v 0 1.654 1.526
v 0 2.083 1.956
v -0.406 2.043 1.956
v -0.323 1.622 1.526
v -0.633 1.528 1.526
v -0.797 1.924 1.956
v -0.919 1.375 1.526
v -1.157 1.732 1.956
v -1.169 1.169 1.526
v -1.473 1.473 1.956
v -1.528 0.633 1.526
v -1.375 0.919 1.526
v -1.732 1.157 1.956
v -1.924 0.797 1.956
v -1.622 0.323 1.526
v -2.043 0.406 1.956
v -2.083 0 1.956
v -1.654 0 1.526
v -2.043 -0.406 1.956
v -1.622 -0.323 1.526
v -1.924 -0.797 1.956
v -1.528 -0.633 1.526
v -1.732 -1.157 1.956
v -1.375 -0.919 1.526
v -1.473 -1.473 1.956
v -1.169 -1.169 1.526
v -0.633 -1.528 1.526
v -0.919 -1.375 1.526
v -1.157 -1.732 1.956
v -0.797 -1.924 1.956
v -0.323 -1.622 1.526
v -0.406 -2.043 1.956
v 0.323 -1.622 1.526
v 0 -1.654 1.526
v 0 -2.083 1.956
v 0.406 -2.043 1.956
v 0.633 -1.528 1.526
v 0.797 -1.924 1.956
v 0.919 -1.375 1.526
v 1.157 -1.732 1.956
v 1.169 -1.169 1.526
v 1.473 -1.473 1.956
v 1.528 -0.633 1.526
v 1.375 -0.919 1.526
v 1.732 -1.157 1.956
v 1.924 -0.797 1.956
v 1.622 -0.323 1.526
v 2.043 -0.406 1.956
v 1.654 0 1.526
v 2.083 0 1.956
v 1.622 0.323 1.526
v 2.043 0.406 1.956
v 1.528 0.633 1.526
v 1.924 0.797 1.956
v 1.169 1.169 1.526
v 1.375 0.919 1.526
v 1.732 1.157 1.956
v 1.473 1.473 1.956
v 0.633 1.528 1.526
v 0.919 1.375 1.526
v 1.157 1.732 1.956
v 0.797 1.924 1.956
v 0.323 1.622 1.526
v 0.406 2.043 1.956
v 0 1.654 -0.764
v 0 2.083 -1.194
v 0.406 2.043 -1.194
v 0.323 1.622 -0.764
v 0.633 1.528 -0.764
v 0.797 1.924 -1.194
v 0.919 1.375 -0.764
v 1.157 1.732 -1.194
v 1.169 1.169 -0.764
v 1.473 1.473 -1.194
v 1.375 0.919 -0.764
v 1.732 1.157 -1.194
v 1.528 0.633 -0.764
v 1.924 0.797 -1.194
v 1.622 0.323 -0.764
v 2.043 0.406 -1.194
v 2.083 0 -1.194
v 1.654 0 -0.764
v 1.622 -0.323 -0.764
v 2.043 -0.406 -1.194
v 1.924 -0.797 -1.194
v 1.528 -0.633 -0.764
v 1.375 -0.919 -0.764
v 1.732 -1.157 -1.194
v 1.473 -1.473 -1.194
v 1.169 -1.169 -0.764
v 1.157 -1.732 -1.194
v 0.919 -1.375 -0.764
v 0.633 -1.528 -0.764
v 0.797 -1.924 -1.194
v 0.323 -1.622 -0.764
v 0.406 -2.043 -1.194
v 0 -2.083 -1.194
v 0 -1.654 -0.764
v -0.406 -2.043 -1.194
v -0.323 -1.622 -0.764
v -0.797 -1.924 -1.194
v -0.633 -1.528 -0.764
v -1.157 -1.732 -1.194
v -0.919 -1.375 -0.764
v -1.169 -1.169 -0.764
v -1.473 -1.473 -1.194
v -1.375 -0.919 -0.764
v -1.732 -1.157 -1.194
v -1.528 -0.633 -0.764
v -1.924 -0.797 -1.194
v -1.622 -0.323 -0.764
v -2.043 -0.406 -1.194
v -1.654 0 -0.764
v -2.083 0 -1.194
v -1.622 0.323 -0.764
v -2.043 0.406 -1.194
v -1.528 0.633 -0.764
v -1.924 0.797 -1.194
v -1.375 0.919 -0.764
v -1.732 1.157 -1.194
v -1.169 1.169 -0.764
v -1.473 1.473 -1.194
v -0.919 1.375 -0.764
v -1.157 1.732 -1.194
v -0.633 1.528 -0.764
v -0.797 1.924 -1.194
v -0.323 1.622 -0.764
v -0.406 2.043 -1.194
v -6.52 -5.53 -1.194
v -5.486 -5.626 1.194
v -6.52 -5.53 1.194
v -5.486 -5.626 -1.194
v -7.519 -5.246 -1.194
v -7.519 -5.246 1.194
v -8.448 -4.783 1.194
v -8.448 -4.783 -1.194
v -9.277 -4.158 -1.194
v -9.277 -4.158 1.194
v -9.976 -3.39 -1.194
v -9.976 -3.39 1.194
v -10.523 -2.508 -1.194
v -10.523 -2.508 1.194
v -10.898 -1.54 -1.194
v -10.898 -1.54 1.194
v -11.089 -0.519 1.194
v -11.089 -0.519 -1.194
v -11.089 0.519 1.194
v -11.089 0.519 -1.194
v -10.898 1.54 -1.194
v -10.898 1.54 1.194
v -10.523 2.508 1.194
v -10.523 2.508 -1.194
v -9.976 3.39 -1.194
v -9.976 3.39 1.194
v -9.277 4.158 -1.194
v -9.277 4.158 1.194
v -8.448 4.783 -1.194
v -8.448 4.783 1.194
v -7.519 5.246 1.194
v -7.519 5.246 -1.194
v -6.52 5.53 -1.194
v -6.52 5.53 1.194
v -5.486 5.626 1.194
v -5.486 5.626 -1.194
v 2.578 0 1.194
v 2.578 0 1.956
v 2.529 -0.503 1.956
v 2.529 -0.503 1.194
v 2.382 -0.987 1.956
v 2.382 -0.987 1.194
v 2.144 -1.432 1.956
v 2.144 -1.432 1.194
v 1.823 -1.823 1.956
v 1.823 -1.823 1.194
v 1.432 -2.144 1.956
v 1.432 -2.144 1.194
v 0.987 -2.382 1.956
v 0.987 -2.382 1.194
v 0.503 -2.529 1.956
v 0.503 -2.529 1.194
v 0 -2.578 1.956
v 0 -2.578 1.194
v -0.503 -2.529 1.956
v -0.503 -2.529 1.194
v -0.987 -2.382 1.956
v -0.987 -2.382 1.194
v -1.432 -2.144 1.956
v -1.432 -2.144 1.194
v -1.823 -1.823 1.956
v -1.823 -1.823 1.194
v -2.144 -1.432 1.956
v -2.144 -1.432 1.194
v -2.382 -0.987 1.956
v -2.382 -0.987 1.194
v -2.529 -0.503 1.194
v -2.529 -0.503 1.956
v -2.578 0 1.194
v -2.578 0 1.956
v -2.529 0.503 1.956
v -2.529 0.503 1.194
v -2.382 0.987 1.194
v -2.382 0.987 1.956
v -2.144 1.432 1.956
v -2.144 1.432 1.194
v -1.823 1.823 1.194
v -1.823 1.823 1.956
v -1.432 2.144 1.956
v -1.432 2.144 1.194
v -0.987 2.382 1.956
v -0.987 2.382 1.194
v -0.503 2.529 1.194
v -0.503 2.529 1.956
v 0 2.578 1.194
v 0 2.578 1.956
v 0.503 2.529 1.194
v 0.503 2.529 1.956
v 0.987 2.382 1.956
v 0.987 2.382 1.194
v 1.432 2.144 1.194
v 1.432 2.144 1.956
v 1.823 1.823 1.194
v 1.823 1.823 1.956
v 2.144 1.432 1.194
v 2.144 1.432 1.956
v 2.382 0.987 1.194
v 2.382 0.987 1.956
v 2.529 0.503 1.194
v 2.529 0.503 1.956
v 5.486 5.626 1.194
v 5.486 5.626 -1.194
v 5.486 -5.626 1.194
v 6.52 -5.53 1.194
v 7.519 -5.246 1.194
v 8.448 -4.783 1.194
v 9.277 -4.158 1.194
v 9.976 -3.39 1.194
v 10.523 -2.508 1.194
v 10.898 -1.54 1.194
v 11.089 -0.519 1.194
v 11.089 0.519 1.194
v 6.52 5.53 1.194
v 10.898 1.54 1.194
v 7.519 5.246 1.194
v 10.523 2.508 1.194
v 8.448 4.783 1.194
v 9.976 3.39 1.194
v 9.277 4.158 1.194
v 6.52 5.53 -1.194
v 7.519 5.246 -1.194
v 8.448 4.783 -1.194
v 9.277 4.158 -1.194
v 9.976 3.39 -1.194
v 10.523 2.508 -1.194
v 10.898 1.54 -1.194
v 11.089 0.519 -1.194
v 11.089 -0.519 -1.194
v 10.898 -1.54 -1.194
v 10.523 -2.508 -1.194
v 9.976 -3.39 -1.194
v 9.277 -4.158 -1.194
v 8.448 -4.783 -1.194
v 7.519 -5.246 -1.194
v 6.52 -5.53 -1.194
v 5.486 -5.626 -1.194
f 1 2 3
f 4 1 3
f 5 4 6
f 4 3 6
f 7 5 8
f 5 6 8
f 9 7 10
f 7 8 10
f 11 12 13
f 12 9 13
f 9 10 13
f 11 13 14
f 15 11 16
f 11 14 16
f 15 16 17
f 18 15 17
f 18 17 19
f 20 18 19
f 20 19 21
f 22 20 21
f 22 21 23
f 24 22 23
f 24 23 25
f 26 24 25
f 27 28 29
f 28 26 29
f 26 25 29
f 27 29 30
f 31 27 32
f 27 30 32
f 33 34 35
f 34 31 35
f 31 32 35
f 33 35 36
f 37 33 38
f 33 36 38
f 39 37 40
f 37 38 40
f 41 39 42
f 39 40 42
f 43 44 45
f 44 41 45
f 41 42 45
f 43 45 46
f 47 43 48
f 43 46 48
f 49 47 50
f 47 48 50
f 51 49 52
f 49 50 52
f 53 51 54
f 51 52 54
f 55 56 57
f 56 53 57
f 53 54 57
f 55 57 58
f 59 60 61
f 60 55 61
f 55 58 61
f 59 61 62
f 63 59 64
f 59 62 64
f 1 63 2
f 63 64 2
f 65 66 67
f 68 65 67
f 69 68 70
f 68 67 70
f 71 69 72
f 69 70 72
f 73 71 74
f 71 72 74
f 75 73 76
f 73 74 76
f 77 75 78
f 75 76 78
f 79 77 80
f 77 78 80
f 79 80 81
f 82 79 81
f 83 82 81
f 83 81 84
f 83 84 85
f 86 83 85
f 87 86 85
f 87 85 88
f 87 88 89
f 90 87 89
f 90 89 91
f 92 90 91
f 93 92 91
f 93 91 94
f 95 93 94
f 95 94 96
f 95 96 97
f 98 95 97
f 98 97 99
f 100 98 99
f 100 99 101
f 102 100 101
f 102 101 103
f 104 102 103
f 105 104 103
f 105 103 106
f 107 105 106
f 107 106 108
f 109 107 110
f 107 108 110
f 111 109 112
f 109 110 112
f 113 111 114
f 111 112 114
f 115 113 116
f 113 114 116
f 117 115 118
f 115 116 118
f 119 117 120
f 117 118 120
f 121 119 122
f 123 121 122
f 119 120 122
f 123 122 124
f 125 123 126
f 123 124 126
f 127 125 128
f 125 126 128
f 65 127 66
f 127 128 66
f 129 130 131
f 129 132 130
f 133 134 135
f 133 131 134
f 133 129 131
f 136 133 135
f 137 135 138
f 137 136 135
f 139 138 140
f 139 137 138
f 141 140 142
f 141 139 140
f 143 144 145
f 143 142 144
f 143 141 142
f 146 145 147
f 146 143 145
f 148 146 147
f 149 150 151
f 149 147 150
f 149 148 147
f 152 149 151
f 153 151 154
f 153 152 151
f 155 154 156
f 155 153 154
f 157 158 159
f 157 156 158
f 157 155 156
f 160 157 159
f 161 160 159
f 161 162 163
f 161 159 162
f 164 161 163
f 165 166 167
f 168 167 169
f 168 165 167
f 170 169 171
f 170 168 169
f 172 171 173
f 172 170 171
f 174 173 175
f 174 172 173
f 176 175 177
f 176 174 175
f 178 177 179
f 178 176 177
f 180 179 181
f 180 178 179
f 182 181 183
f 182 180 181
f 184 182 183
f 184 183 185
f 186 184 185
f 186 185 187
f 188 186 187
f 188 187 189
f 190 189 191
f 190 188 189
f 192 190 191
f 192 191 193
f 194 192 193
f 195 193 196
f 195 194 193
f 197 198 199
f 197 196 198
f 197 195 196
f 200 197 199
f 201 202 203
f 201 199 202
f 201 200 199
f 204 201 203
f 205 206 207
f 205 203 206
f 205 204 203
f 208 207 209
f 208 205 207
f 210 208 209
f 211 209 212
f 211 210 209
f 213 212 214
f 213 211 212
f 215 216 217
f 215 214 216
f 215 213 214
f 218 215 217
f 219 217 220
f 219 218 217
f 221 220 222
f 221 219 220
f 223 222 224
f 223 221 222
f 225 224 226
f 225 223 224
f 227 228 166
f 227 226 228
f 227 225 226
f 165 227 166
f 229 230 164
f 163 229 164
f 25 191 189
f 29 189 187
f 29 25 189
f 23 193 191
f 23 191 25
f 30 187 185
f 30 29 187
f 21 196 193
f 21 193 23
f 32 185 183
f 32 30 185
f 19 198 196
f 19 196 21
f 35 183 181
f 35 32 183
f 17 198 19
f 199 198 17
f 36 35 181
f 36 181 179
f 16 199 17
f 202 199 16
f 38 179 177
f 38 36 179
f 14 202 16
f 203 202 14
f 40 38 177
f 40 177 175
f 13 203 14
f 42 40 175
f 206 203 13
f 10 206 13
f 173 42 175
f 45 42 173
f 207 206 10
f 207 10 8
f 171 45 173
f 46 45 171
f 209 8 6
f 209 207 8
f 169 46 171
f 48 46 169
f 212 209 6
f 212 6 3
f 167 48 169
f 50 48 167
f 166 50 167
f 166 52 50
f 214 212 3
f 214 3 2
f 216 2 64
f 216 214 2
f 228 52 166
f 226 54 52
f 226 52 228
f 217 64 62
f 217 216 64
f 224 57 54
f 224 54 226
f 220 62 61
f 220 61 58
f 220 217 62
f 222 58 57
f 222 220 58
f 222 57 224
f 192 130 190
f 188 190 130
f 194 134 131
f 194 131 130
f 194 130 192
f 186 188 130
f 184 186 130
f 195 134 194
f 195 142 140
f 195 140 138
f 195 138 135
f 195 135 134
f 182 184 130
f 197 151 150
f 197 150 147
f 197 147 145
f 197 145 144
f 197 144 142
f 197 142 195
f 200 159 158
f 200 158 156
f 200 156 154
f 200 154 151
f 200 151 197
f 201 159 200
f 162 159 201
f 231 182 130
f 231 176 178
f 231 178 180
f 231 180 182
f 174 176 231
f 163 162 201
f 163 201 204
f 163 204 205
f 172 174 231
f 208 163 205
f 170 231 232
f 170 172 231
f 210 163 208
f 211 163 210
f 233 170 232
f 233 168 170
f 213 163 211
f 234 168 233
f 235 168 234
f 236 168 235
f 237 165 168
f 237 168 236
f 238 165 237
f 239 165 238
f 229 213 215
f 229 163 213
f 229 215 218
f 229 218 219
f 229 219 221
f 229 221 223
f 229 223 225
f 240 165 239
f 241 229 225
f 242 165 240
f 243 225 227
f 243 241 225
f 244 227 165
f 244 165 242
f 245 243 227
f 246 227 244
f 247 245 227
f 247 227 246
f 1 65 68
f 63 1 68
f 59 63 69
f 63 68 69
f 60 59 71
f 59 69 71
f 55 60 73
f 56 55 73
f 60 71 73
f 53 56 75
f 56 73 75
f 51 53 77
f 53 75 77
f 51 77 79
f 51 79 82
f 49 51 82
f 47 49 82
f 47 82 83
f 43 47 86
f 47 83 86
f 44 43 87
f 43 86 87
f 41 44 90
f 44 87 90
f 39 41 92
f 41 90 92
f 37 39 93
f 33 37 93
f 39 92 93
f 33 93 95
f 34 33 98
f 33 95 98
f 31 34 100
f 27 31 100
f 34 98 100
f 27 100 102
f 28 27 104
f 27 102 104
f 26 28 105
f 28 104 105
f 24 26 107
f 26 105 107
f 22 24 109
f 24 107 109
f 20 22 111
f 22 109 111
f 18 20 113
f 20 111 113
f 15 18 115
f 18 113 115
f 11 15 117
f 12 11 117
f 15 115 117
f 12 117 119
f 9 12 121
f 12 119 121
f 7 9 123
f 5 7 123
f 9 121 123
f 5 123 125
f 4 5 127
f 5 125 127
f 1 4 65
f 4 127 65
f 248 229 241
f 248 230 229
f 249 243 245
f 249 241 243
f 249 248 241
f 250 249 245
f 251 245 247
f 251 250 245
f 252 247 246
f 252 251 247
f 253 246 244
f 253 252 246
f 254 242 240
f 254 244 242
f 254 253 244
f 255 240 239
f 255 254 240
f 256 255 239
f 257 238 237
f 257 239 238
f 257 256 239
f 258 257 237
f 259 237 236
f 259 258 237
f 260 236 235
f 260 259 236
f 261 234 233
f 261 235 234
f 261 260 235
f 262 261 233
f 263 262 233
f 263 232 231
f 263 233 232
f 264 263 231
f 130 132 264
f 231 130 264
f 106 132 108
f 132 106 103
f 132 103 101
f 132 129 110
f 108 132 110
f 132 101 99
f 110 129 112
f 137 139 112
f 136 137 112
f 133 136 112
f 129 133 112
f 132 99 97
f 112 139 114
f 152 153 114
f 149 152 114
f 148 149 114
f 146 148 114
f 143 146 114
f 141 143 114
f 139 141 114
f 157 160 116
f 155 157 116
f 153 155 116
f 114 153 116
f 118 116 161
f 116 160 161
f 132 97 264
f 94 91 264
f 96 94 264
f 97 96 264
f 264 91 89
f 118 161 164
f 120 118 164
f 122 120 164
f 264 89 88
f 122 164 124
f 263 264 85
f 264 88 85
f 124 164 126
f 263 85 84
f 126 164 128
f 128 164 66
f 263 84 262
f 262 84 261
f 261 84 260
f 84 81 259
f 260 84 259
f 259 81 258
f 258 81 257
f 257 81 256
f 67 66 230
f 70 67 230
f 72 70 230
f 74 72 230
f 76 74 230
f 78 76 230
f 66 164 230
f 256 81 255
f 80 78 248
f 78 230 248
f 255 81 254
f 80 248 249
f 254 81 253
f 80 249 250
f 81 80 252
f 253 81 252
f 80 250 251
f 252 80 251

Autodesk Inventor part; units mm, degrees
sketch "Sketch_1" plane through (0, 0, 0) normal (0, 0, 1) x (1, 0, 0)
  arc A0 (-5.4864, 5.6261) -> (-5.4864, -5.6261) centre (-5.4864, 0) ccw
  line L0 (-5.4864, -5.6261) -> (5.4864, -5.6261)
  arc A1 (5.4864, -5.6261) -> (5.4864, 5.6261) centre (5.4864, 0) ccw
  line L1 (5.4864, 5.6261) -> (-5.4864, 5.6261)
extrude "Extrusion1" add sketch "Sketch_1" along normal mid plane 2.3876
sketch "Sketch_3" plane through (0, 0, 0) normal (0, 0, 1) x (1, 0, 0)
  circle A0 centre (0, 0) radius 2.5781
extrude "Extrusion2" add sketch "Sketch_3" along normal blind 1.9558
sketch "Sketch_4" plane through (0, 0, 0) normal (1, 0, 0) x (0, 1, 0)
  line L0 (0, -1.1938) -> (0, 1.9558)
  line L1 (0, 1.9558) -> (2.0828, 1.9558)
  line L2 (2.0828, 1.9558) -> (1.6535, 1.5265)
  line L3 (1.6535, 1.5265) -> (1.6535, -0.7645)
  line L4 (1.6535, -0.7645) -> (2.0828, -1.1938)
  line L5 (2.0828, -1.1938) -> (0, -1.1938)
  line L6 (0, -1.1938) -> (0, 1.9558)
revolve "Revolution1" cut sketch "Sketch_4" angle 360 about axis through (0, 0, -1.1938) along (0, 0, -1)
thread "Thread1" size "8-32 UNC" class "2B" standard "ANSI Unified Screw Threads" full length
ref_plane "tnut_XY" through (0, 0, -1.1938) normal (0, 0, 1) x (1, 0, 0)
ref_plane "tnut_YZ" through (0, 0, -1.1938) normal (1, 0, 0) x (0, 1, 0)
ref_plane "tnut_ZX" through (0, 0, -1.1938) normal (0, 1, 0) x (0, 0, 1)
ref_plane "tnut1_XY" through (0, 0, 1.1938) normal (0, 0, 1) x (1, 0, 0)
ref_plane "tnut1_YZ" through (0, 0, 1.1938) normal (1, 0, 0) x (0, 1, 0)
ref_plane "tnut1_ZX" through (0, 0, 1.1938) normal (0, 1, 0) x (0, 0, 1)
properties part number "3275"
